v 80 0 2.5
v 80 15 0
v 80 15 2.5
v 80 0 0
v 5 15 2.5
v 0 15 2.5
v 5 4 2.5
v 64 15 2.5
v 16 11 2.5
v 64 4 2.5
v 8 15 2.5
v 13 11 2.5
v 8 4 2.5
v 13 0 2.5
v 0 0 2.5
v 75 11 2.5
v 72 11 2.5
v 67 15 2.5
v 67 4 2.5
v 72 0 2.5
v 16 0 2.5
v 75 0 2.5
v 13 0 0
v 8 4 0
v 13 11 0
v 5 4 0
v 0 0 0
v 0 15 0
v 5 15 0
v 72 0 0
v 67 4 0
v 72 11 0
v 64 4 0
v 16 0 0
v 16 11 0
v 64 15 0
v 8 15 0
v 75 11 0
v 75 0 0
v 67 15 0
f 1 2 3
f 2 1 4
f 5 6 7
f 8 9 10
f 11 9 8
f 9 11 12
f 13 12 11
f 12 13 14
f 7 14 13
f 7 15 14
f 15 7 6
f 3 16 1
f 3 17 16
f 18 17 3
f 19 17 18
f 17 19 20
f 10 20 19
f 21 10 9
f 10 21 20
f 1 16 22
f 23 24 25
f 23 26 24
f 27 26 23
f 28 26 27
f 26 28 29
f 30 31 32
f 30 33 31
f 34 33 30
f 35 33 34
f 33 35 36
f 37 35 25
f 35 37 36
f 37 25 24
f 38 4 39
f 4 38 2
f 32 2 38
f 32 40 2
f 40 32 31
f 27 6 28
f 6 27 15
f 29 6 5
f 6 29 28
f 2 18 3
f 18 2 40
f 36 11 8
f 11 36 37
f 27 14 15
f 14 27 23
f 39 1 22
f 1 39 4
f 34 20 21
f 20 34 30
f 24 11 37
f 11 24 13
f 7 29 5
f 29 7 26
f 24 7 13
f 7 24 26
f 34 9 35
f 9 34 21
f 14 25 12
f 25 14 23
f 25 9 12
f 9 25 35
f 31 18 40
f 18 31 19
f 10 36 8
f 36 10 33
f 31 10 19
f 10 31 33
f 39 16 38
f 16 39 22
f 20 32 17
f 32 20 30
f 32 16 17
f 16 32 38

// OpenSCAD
difference() {
 cube(size=[80,15,2.5]);
 translate([5,4,-1]) cube(size=[3,17,4]);
 translate([13,-6,-1]) cube(size=[3,17,4]);
 translate([64,4,-1]) cube(size=[3,17,4]);
 translate([72,-6,-1]) cube(size=[3,17,4]);
}
